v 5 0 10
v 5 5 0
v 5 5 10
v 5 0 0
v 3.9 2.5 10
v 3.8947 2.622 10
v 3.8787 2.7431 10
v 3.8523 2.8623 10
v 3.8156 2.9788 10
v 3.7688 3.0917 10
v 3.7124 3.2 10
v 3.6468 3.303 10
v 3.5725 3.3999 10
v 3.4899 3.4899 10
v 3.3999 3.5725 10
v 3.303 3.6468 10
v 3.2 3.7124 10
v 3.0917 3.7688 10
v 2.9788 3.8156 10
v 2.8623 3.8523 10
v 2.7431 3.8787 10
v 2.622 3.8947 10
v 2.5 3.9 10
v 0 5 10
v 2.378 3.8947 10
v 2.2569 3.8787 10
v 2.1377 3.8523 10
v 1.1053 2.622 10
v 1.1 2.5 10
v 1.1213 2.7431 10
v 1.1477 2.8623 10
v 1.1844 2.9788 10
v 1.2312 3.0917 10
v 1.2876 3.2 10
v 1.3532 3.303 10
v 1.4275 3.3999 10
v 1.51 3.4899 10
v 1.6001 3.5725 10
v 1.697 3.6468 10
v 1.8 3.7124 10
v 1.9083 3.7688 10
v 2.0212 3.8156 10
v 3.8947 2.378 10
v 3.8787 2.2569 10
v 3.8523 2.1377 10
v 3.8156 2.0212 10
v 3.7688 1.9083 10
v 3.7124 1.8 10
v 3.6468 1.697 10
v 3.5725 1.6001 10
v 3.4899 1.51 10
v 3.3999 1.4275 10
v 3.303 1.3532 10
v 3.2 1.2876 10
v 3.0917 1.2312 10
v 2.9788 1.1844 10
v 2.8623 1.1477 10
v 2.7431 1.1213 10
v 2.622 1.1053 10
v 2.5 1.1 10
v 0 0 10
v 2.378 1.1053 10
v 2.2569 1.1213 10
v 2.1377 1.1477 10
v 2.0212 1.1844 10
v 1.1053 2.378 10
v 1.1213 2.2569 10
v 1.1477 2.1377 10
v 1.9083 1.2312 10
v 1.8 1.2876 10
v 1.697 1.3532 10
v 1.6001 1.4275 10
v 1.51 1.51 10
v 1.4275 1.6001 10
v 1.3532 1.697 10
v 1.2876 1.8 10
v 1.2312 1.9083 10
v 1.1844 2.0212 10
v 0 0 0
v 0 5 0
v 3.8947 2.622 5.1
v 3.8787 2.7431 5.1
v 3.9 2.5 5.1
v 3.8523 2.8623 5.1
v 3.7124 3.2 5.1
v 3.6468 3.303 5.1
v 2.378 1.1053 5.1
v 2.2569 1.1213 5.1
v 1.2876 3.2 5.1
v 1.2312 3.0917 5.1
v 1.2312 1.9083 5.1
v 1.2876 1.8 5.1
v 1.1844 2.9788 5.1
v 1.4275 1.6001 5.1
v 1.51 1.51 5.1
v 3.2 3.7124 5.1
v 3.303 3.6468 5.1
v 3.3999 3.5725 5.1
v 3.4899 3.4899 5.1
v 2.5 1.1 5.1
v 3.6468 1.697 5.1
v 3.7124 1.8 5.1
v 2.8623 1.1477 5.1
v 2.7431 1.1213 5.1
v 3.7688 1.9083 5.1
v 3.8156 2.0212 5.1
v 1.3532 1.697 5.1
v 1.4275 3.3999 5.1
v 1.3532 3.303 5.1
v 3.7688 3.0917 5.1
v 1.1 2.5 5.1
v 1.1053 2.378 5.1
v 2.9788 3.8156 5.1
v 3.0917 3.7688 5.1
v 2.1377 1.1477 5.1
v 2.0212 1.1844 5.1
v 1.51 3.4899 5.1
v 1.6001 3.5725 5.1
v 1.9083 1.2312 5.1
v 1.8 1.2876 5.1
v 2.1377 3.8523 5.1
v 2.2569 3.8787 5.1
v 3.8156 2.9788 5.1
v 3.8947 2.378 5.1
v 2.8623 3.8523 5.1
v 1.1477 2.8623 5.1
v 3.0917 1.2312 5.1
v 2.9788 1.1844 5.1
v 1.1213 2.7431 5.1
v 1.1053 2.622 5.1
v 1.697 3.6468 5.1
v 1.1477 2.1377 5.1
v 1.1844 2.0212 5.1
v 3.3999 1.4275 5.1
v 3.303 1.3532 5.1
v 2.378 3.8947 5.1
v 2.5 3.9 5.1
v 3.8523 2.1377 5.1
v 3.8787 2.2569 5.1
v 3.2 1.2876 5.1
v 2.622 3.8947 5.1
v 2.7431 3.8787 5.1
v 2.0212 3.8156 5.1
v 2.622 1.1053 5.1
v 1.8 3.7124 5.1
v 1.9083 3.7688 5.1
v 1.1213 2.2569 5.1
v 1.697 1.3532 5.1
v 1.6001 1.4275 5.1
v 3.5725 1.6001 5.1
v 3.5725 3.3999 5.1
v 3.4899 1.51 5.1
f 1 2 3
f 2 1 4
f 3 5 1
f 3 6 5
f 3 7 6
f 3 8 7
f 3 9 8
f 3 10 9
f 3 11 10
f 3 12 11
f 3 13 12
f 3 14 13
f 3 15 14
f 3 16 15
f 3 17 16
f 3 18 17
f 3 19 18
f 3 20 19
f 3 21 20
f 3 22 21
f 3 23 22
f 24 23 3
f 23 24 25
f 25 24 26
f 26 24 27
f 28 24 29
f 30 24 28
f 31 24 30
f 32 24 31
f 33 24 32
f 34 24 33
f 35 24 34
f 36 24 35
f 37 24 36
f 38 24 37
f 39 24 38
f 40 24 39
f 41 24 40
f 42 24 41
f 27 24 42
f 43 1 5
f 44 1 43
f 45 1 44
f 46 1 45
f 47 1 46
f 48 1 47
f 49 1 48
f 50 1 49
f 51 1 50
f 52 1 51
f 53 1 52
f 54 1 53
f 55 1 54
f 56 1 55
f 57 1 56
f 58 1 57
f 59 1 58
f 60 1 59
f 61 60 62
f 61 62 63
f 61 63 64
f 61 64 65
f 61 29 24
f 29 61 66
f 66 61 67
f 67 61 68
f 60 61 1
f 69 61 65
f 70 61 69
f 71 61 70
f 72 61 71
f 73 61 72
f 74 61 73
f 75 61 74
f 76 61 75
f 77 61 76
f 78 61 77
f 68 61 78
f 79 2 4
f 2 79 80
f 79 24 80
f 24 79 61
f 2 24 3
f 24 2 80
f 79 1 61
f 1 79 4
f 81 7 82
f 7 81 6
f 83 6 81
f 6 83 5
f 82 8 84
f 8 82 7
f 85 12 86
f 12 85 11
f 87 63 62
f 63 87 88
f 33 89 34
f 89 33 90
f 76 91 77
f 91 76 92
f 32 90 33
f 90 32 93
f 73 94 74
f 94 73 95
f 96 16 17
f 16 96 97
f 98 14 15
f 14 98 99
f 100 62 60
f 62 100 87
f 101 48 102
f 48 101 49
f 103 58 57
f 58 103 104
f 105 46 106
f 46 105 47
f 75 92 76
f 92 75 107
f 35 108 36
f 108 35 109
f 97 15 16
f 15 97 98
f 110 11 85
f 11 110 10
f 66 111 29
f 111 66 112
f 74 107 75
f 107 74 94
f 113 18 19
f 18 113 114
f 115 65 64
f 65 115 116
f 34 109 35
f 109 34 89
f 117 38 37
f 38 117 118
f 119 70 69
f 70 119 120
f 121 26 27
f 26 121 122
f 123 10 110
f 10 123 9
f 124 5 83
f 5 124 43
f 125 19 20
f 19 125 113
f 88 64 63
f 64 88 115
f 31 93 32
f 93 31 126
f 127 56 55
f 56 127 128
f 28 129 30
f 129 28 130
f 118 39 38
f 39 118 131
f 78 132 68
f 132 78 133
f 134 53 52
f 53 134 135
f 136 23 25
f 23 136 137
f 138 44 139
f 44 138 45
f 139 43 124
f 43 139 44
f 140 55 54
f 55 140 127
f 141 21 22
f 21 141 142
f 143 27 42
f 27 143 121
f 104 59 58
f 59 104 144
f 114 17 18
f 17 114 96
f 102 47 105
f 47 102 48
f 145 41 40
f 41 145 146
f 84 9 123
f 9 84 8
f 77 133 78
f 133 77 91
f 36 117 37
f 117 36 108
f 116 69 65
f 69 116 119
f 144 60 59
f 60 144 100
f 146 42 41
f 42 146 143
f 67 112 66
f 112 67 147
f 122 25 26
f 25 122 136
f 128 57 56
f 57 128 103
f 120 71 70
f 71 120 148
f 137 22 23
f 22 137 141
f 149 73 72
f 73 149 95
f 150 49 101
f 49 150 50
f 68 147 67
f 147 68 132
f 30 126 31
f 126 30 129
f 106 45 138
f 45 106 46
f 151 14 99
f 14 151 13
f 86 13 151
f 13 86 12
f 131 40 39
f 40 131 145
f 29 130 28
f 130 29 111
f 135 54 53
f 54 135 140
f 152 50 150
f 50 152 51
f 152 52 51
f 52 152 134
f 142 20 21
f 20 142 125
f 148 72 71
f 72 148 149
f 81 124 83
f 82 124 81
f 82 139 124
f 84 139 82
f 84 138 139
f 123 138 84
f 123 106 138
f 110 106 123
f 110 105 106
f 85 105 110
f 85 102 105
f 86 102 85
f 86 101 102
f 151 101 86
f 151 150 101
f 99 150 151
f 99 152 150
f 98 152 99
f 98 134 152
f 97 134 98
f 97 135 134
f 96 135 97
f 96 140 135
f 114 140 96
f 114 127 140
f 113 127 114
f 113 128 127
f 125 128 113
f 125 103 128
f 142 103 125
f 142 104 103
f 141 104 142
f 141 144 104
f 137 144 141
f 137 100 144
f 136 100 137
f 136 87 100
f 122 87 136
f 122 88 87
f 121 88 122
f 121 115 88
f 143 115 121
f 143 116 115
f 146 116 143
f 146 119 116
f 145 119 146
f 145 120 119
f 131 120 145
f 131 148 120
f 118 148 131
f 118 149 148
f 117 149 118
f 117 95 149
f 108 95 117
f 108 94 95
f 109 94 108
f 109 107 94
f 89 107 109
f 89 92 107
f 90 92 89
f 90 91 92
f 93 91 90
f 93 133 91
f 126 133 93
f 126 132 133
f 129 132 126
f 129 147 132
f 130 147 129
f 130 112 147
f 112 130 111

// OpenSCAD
/* 
This script is useful for testing sizes for metric screw holes. In general, a diameter of 0.2mm less than the  nominal diameter of the screw allows a standard screw to self-tap into a PLA print, e.g. print a 2.8mm hole for an M3 screw.
 */
// Global resolution
$fs = 0.1;  // Don't generate smaller facets than 0.1 mm
$fa = 5;    // Don't generate larger angles than 5 degrees

// Widgth and height of cube
$cubelen = 5.0;
// Diameter of bore hole
$diameter = 2.8;
// Height of the whole cube
$height = 10.0;

module box() {
    cube([$cubelen,$cubelen,$height]);
}
module hole() {
    translate([$cubelen/2, $cubelen/2, ($height/2)+0.1])
    cylinder(h=$height*0.7, r=$diameter/2, center=false);
}

difference() {
    box();
    hole(); 
}
